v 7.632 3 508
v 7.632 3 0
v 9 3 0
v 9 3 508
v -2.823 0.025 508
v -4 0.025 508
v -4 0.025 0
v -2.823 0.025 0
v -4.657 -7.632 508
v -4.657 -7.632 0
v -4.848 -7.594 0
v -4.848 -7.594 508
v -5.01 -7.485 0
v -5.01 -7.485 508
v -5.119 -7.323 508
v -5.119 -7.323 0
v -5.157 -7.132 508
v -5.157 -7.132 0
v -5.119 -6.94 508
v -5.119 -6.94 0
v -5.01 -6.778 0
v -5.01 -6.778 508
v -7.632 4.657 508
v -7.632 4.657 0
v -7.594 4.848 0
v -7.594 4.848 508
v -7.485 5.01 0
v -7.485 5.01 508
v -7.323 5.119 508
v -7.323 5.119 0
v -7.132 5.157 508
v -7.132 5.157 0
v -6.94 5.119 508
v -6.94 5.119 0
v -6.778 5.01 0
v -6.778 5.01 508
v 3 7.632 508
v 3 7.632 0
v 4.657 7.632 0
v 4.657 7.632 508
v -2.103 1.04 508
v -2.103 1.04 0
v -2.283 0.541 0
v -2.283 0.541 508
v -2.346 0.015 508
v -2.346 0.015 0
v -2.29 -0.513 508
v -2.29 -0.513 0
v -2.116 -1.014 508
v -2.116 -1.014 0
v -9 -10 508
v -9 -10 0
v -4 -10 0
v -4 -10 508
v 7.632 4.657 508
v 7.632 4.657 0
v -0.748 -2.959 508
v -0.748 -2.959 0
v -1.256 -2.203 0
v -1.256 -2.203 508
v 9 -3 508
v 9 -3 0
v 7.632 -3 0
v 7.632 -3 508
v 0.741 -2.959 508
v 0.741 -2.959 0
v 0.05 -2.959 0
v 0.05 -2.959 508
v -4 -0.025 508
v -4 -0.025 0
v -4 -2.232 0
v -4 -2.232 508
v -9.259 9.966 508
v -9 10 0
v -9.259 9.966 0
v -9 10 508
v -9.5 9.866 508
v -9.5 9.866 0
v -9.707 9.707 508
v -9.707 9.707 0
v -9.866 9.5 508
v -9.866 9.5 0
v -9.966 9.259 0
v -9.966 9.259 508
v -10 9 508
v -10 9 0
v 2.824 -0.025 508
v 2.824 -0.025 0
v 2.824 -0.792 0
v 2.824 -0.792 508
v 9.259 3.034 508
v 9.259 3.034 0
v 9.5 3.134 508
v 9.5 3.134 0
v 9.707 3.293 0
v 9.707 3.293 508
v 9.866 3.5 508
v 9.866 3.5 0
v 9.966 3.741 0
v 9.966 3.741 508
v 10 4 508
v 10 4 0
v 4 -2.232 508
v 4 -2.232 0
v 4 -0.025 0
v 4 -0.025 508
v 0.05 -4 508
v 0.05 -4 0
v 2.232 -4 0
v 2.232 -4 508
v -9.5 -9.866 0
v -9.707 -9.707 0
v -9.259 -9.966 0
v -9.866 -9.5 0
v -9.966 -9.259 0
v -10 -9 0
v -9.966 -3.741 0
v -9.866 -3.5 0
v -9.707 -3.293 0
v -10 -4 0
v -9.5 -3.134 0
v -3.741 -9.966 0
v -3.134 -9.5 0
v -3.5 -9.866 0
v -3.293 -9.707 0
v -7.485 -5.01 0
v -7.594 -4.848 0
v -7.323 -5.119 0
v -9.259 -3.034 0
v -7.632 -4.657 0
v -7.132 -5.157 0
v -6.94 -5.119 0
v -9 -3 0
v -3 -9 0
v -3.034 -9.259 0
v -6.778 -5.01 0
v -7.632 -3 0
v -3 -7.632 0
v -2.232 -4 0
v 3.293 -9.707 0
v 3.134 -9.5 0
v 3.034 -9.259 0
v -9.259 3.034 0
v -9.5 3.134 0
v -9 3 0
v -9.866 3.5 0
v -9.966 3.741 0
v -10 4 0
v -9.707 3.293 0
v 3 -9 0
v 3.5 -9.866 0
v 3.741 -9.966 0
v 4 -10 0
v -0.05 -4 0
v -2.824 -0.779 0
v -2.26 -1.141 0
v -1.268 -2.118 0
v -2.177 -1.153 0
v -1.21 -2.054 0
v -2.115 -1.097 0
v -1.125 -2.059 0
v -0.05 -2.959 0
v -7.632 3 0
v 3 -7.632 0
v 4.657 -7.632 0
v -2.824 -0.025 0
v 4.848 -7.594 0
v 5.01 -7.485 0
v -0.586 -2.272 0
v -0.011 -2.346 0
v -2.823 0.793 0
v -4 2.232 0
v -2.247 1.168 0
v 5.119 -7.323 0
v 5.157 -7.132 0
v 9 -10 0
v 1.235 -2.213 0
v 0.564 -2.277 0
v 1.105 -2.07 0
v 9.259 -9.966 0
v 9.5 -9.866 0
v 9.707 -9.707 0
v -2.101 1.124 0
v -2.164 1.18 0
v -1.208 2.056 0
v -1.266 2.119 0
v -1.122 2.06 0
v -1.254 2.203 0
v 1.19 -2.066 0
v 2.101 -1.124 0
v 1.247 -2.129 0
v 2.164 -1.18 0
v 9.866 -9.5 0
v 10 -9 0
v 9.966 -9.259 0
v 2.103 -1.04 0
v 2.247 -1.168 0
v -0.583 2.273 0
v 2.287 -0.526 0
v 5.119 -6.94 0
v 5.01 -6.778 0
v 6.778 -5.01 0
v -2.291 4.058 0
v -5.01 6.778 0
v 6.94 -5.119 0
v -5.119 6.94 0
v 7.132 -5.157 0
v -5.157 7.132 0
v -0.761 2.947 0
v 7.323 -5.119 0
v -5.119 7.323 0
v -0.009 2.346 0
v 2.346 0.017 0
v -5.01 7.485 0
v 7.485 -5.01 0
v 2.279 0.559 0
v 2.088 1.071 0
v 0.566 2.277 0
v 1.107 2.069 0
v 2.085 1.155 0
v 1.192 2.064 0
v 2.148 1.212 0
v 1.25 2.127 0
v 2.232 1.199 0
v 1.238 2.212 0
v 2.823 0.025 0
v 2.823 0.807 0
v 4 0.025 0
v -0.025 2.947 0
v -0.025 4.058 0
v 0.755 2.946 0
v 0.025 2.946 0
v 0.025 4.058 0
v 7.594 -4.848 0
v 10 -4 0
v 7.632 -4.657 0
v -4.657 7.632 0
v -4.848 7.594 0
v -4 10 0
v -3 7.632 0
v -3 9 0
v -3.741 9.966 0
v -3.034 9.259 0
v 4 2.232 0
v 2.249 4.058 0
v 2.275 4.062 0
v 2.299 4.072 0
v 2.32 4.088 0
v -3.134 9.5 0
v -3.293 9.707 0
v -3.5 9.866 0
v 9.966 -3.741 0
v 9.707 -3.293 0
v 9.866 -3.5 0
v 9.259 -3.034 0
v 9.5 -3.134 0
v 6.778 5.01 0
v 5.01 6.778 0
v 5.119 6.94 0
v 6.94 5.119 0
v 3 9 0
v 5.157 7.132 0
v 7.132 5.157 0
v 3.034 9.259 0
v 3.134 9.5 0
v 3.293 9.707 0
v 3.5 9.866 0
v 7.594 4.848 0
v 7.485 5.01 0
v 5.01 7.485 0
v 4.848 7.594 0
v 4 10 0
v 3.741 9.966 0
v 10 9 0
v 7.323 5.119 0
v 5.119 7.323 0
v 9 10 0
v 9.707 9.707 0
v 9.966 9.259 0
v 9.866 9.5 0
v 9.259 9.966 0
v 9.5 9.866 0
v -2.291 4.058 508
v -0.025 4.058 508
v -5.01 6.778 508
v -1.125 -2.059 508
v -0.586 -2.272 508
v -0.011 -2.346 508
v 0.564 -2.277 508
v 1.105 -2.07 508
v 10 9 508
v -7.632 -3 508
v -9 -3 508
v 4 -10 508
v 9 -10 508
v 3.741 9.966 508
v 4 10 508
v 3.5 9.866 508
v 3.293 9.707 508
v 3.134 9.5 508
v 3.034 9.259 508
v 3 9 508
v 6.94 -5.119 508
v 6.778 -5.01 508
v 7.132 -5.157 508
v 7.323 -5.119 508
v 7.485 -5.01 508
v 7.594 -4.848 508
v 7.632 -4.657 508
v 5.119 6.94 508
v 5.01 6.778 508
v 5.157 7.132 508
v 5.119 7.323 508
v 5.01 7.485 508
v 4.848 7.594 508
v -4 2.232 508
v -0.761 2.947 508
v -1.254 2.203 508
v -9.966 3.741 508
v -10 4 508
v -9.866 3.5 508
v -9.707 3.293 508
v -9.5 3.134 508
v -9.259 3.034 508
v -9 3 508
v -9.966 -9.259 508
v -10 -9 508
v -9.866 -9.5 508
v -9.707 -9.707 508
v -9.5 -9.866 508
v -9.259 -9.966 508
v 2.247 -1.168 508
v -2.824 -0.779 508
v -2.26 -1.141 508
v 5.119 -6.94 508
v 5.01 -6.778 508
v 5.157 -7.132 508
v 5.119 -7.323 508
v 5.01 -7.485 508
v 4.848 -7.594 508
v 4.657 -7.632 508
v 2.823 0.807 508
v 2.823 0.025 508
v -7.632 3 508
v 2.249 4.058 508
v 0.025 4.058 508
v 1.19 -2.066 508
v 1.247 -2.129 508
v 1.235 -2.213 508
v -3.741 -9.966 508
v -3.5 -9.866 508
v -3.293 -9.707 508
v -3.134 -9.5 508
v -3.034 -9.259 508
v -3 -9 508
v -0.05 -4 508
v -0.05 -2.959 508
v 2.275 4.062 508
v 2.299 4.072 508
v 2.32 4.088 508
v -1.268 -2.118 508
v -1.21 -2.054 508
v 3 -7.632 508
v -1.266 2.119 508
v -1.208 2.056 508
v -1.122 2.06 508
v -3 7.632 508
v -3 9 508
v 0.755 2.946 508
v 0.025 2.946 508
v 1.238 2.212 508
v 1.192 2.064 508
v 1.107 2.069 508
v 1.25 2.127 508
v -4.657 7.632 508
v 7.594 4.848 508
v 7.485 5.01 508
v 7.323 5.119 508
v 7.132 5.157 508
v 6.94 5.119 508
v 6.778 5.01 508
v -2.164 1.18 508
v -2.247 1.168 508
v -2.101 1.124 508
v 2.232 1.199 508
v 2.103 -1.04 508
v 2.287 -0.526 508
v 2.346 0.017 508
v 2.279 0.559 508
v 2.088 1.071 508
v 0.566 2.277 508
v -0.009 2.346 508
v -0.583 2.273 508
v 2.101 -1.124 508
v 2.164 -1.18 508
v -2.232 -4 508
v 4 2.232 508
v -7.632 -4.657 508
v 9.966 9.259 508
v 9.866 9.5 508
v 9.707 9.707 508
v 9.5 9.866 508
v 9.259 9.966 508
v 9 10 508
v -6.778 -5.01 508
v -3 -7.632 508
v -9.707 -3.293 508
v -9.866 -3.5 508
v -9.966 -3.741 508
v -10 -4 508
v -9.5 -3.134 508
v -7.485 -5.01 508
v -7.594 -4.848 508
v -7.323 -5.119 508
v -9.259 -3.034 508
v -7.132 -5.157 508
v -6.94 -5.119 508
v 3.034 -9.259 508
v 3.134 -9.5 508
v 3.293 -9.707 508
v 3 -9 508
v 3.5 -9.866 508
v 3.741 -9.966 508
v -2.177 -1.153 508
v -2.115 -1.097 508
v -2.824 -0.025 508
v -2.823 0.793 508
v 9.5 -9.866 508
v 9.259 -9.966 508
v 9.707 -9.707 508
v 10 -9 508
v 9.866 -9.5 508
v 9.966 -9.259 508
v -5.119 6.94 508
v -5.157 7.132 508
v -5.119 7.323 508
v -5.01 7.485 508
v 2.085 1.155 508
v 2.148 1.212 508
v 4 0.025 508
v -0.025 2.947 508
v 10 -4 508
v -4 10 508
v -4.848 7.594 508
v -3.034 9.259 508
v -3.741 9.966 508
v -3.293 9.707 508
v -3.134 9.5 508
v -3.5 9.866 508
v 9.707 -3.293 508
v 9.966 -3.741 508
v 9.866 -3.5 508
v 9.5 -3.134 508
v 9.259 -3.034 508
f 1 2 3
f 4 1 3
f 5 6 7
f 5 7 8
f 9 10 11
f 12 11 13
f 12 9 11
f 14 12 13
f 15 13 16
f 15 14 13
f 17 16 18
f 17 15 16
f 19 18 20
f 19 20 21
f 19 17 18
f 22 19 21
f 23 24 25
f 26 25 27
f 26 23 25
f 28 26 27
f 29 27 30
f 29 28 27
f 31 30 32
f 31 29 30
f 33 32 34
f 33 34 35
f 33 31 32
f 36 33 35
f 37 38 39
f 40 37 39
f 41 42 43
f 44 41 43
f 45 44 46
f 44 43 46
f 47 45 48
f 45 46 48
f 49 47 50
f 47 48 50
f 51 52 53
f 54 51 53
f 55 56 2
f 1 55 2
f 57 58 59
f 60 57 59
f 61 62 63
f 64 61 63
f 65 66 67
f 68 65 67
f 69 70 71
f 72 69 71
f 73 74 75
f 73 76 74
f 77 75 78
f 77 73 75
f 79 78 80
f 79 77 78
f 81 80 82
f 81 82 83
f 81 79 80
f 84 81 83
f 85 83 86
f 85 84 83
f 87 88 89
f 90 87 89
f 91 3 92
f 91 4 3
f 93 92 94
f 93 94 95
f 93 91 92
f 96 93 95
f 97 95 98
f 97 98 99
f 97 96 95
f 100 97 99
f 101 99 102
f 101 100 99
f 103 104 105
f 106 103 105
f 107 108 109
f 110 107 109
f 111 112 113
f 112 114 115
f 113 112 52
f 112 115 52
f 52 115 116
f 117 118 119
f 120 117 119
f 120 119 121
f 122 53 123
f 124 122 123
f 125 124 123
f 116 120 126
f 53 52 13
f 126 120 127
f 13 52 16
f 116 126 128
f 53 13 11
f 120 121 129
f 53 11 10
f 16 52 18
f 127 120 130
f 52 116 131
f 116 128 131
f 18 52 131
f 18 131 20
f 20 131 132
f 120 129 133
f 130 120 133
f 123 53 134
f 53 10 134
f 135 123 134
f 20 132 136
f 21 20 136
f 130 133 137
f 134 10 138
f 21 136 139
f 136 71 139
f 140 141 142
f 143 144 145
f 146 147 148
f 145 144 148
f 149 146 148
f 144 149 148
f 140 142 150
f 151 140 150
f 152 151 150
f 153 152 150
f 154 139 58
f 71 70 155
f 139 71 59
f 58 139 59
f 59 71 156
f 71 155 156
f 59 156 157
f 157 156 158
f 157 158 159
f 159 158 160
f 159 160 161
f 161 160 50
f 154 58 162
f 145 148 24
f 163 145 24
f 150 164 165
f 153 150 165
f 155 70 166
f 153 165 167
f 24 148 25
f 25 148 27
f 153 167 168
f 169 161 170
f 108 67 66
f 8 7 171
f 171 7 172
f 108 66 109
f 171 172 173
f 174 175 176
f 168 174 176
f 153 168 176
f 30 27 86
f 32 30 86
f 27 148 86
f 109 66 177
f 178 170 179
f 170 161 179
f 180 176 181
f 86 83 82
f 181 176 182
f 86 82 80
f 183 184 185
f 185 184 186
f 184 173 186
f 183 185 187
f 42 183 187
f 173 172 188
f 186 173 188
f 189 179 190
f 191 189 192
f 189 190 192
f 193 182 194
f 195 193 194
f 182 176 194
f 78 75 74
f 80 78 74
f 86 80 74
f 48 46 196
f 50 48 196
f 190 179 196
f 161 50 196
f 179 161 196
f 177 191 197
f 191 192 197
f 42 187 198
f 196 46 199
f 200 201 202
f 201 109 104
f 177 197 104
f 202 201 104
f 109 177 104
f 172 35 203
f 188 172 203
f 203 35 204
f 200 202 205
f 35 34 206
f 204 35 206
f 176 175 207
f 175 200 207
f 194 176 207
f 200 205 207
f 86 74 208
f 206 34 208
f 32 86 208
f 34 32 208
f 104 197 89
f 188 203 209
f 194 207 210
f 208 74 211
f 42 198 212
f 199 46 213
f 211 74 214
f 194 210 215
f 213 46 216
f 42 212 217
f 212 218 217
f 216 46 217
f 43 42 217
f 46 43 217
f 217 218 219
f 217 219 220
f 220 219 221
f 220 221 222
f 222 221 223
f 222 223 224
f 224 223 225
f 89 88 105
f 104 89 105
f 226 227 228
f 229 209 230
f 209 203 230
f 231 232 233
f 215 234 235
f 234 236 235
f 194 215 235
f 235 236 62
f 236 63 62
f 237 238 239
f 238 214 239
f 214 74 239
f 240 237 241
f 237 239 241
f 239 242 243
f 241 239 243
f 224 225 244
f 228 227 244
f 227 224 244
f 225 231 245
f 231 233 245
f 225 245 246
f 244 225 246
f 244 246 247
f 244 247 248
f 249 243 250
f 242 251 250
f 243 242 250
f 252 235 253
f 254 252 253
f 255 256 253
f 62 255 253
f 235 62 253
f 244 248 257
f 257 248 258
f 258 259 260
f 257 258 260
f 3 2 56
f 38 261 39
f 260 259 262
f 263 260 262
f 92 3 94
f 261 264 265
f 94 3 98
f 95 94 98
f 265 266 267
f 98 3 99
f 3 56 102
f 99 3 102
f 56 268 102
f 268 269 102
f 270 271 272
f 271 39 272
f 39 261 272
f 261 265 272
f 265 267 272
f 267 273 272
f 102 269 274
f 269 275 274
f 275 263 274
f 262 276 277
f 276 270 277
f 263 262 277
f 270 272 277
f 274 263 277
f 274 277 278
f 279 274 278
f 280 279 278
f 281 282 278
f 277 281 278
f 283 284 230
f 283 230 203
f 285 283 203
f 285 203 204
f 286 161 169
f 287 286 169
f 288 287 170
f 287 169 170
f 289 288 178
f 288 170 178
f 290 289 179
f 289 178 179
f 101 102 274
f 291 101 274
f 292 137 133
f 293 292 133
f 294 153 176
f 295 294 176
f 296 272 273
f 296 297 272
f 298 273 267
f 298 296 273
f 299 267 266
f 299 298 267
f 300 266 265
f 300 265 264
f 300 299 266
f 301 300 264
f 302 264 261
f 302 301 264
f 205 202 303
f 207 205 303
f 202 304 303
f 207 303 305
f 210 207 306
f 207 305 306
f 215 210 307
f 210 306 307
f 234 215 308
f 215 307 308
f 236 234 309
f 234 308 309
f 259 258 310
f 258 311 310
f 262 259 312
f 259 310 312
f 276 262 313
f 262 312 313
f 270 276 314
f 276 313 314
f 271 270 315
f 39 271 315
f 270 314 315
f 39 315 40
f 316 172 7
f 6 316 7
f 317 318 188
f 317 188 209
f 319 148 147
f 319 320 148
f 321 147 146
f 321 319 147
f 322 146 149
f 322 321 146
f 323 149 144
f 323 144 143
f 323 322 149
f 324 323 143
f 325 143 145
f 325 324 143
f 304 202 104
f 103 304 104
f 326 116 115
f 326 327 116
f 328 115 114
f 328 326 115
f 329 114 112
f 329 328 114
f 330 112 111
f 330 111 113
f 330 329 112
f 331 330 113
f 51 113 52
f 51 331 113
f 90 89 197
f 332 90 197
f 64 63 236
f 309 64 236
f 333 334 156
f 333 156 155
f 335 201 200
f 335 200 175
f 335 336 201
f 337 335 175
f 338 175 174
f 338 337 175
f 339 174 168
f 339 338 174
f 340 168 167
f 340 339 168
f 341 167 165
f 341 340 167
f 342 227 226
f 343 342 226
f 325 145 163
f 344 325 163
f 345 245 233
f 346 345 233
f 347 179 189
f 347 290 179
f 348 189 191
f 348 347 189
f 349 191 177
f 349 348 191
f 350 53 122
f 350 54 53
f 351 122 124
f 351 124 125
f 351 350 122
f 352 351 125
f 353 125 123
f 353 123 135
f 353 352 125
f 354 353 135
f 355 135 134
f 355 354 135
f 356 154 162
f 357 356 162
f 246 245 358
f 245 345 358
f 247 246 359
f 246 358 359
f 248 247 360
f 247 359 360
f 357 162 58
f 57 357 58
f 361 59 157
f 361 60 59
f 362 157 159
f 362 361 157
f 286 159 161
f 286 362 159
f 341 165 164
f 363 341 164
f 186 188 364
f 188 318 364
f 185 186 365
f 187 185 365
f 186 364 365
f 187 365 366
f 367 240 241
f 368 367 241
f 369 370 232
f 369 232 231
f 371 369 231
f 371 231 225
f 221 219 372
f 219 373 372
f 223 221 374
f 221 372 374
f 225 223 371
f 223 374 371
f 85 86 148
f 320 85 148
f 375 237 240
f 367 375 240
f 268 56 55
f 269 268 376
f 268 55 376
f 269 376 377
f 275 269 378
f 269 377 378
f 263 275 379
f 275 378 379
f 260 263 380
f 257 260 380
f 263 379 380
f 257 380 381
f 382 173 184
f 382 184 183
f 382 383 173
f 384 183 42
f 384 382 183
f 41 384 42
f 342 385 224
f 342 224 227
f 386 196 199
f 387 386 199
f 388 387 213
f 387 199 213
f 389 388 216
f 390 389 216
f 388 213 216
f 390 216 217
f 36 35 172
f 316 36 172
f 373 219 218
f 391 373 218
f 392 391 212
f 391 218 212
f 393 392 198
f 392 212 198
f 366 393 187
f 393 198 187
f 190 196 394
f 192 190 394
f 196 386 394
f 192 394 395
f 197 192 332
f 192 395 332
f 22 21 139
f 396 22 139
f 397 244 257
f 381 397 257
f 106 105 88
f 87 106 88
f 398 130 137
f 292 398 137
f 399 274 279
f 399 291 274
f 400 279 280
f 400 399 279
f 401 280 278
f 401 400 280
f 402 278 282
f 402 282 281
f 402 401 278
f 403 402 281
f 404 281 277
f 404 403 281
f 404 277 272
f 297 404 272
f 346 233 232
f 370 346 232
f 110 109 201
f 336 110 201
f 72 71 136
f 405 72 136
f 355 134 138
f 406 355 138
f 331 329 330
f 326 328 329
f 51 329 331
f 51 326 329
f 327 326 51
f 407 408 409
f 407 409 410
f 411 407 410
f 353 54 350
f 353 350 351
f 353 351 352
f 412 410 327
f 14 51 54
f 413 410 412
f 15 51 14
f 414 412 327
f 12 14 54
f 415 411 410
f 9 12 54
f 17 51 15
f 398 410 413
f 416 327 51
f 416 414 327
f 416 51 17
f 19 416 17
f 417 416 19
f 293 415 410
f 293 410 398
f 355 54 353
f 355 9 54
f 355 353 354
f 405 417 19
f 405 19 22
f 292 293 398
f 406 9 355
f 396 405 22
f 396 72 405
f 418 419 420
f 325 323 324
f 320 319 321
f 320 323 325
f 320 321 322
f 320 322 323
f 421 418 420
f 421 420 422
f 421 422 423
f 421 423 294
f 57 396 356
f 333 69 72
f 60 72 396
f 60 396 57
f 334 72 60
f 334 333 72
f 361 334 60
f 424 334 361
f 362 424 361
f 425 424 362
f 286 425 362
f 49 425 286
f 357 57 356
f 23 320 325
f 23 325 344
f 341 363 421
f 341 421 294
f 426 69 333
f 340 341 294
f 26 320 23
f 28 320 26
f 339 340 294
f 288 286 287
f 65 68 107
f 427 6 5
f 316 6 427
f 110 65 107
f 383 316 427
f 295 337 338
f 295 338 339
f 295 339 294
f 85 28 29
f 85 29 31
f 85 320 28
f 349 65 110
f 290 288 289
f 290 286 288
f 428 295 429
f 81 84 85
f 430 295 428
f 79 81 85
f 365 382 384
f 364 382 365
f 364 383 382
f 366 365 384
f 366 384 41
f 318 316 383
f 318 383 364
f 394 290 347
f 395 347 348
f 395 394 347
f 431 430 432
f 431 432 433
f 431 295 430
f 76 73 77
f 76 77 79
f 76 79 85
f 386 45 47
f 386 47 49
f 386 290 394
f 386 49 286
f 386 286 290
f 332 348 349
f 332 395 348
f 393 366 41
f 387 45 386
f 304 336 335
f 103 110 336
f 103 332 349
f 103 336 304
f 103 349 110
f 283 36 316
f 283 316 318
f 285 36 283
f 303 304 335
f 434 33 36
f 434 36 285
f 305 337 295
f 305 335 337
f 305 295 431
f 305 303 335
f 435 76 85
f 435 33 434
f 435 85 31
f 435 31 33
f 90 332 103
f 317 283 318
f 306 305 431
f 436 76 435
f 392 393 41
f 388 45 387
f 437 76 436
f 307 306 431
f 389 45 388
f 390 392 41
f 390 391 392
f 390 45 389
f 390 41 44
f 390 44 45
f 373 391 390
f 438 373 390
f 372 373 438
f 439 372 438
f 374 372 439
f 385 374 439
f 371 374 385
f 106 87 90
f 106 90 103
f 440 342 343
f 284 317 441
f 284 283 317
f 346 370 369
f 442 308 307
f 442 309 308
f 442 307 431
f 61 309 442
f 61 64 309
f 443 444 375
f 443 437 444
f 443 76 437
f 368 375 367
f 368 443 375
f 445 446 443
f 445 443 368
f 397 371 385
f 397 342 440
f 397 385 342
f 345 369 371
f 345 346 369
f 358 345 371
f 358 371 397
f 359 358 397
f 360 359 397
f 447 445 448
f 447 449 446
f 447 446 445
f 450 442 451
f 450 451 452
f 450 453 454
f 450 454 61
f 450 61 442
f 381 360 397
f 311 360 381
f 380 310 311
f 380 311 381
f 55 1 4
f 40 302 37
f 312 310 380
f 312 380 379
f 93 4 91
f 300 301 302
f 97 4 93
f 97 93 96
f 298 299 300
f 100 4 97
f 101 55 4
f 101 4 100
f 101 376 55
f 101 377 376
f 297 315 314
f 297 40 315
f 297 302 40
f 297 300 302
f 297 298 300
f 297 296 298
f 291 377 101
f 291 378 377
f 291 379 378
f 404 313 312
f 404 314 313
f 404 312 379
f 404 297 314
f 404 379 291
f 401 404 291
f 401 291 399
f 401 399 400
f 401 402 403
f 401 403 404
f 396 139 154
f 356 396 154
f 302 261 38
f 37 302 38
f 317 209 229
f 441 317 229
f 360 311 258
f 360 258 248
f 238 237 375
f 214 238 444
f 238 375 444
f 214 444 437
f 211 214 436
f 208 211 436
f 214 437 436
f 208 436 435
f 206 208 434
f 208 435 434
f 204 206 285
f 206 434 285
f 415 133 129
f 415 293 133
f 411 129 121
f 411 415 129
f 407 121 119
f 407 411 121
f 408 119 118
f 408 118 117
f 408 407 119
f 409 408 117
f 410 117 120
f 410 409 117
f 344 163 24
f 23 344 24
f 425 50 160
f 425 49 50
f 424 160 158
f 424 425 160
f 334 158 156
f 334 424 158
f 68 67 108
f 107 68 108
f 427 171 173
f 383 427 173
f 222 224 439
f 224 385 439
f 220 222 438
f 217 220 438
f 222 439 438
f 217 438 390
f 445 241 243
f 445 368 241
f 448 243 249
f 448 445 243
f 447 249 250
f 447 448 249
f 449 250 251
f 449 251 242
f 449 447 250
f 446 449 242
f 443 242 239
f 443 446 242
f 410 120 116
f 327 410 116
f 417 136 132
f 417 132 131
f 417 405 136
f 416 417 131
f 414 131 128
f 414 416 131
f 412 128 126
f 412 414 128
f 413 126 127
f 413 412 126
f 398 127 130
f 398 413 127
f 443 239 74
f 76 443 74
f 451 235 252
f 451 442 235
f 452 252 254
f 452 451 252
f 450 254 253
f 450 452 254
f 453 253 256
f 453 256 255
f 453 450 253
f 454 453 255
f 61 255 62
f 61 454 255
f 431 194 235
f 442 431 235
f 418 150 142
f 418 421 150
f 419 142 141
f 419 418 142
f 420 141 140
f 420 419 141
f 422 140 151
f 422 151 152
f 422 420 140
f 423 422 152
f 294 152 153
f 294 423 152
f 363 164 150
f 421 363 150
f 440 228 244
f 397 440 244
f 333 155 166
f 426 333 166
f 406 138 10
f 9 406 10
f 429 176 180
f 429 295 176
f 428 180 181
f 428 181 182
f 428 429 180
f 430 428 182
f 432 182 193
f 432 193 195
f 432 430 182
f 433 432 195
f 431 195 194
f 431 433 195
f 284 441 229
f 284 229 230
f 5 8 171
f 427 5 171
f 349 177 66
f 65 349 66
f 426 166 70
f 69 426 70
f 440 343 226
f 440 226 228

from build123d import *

# Parameters (mm, degrees)
F1_DEPTH = 508
F2_R     = 1
F3_R     = 0.5
F4_R     = 0.1


with BuildPart() as f1:
    # F0 (on Top) → F1 (new body)
    with BuildSketch(Plane.XY):
        with BuildLine():
            Line((-0.025, 4.0583112277), (-2.2905442747, 4.0583112277))
            Line((-2.2905442747, 4.0583112277), (-5.8640526549, 7.6318196079))
            Line((-5.8640526549, 7.6318196079), (-3, 7.6318196079))
            Line((-3, 7.6318196079), (-3, 10))
            Line((-3, 10), (-10, 10))
            Line((-10, 10), (-10, 3))
            Line((-10, 3), (-7.6318196079, 3))
            Line((-7.6318196079, 3), (-7.6318196079, 5.8640526549))
            Line((-7.6318196079, 5.8640526549), (-4, 2.232233047))
            Line((-4, 2.232233047), (-4, 0.025))
            Line((-4, 0.025), (-2.8230957687, 0.025))
            Line((-2.8230957687, 0.025), (-2.8230957687, 0.7926485917))
            Line((-2.8230957687, 0.7926485917), (-1.8740334308, 1.411684829))
            ThreePointArc((-1.8740334308, 1.411684829), (-2.3460869309, 0.0270456781), (-1.906078865, -1.3681077138))
            Line((-1.906078865, -1.3681077138), (-2.8238623803, -0.7794121329))
            Line((-2.8238623803, -0.7794121329), (-2.8238623803, -0.025))
            Line((-2.8238623803, -0.025), (-4, -0.025))
            Line((-4, -0.025), (-4, -2.232233047))
            Line((-4, -2.232233047), (-7.6318196079, -5.8640526549))
            Line((-7.6318196079, -5.8640526549), (-7.6318196079, -3))
            Line((-7.6318196079, -3), (-10, -3))
            Line((-10, -3), (-10, -10))
            Line((-10, -10), (-3, -10))
            Line((-3, -10), (-3, -7.6318196079))
            Line((-3, -7.6318196079), (-5.8640526549, -7.6318196079))
            Line((-5.8640526549, -7.6318196079), (-2.232233047, -4))
            Line((-2.232233047, -4), (-0.05, -4))
            Line((-0.05, -4), (-0.05, -2.9588690959))
            Line((-0.05, -2.9588690959), (-0.7483266194, -2.9588690959))
            Line((-0.7483266194, -2.9588690959), (-1.5537911294, -1.7580069631))
            ThreePointArc((-1.5537911294, -1.7580069631), (-0.0257632285, -2.3461013645), (1.5148107083, -1.7917041816))
            Line((1.5148107083, -1.7917041816), (0.7406048023, -2.9588690959))
            Line((0.7406048023, -2.9588690959), (0.05, -2.9588690959))
            Line((0.05, -2.9588690959), (0.05, -4))
            Line((0.05, -4), (2.232233047, -4))
            Line((2.232233047, -4), (5.8640526549, -7.6318196079))
            Line((5.8640526549, -7.6318196079), (3, -7.6318196079))
            Line((3, -7.6318196079), (3, -10))
            Line((3, -10), (10, -10))
            Line((10, -10), (10, -3))
            Line((10, -3), (7.6318196079, -3))
            Line((7.6318196079, -3), (7.6318196079, -5.8640526549))
            Line((7.6318196079, -5.8640526549), (4, -2.232233047))
            Line((4, -2.232233047), (4, -0.025))
            Line((4, -0.025), (2.8238623803, -0.025))
            Line((2.8238623803, -0.025), (2.8238623803, -0.7921485609))
            Line((2.8238623803, -0.7921485609), (1.8740334308, -1.411684829))
            ThreePointArc((1.8740334308, -1.411684829), (2.3460040432, 0.0334721598), (1.8329957125, 1.4645757318))
            Line((1.8329957125, 1.4645757318), (2.8230957687, 0.8068363719))
            Line((2.8230957687, 0.8068363719), (2.8230957687, 0.025))
            Line((2.8230957687, 0.025), (4, 0.025))
            Line((4, 0.025), (4, 2.232233047))
            Line((4, 2.232233047), (7.6318196079, 5.8640526549))
            Line((7.6318196079, 5.8640526549), (7.6318196079, 3))
            Line((7.6318196079, 3), (10, 3))
            Line((10, 3), (10, 10))
            Line((10, 10), (3, 10))
            Line((3, 10), (3, 7.6318196079))
            Line((3, 7.6318196079), (5.8640526549, 7.6318196079))
            Line((5.8640526549, 7.6318196079), (2.2905442747, 4.0583112277))
            Line((2.2905442747, 4.0583112277), (0.025, 4.0583112277))
            Line((0.025, 4.0583112277), (0.025, 2.9460287187))
            Line((0.025, 2.9460287187), (0.7554459771, 2.9460287187))
            Line((0.7554459771, 2.9460287187), (1.5118729288, 1.7941838266))
            ThreePointArc((1.5118729288, 1.7941838266), (-0.0195250931, 2.3461615731), (-1.5415243666, 1.7687730164))
            Line((-1.5415243666, 1.7687730164), (-0.7608180556, 2.9474266339))
            Line((-0.7608180556, 2.9474266339), (-0.025, 2.9474266339))
            Line((-0.025, 2.9474266339), (-0.025, 4.0583112277))
        make_face()
    extrude(amount=F1_DEPTH)

    # F2
    f2_edges = [f1.edges().sort_by_distance(p)[0] for p in [
        (10, 10, 254),
        (10, -10, 254),
        (-10, -10, 254),
        (-3, -10, 254),
        (3, -10, 254),
        (-3, 10, 254),
        (-10, 3, 254),
        (10, 3, 254),
        (10, -3, 254),
        (-10, -3, 254),
        (-10, 10, 254),
        (3, 10, 254),
    ]]
    fillet(f2_edges, radius=F2_R)

    # F3
    f3_edges = [f1.edges().sort_by_distance(p)[0] for p in [
        (-7.63182, 5.864053, 254),
        (-5.864053, 7.63182, 254),
        (5.864053, 7.63182, 254),
        (7.63182, 5.864053, 254),
        (-7.63182, -5.864053, 254),
        (-5.864053, -7.63182, 254),
        (5.864053, -7.63182, 254),
        (7.63182, -5.864053, 254),
    ]]
    fillet(f3_edges, radius=F3_R)

    # F4
    f4_edges = [f1.edges().sort_by_distance(p)[0] for p in [
        (-1.874033, 1.411685, 254),
        (2.290544, 4.058311, 254),
        (4.656946, 7.63182, 254),
        (-1.541524, 1.768773, 254),
        (1.514811, -1.791704, 254),
        (1.874033, -1.411685, 254),
        (1.832996, 1.464576, 254),
        (1.511873, 1.794184, 254),
        (-1.906079, -1.368108, 254),
        (-1.553791, -1.758007, 254),
    ]]
    fillet(f4_edges, radius=F4_R)


solid = f1.part
